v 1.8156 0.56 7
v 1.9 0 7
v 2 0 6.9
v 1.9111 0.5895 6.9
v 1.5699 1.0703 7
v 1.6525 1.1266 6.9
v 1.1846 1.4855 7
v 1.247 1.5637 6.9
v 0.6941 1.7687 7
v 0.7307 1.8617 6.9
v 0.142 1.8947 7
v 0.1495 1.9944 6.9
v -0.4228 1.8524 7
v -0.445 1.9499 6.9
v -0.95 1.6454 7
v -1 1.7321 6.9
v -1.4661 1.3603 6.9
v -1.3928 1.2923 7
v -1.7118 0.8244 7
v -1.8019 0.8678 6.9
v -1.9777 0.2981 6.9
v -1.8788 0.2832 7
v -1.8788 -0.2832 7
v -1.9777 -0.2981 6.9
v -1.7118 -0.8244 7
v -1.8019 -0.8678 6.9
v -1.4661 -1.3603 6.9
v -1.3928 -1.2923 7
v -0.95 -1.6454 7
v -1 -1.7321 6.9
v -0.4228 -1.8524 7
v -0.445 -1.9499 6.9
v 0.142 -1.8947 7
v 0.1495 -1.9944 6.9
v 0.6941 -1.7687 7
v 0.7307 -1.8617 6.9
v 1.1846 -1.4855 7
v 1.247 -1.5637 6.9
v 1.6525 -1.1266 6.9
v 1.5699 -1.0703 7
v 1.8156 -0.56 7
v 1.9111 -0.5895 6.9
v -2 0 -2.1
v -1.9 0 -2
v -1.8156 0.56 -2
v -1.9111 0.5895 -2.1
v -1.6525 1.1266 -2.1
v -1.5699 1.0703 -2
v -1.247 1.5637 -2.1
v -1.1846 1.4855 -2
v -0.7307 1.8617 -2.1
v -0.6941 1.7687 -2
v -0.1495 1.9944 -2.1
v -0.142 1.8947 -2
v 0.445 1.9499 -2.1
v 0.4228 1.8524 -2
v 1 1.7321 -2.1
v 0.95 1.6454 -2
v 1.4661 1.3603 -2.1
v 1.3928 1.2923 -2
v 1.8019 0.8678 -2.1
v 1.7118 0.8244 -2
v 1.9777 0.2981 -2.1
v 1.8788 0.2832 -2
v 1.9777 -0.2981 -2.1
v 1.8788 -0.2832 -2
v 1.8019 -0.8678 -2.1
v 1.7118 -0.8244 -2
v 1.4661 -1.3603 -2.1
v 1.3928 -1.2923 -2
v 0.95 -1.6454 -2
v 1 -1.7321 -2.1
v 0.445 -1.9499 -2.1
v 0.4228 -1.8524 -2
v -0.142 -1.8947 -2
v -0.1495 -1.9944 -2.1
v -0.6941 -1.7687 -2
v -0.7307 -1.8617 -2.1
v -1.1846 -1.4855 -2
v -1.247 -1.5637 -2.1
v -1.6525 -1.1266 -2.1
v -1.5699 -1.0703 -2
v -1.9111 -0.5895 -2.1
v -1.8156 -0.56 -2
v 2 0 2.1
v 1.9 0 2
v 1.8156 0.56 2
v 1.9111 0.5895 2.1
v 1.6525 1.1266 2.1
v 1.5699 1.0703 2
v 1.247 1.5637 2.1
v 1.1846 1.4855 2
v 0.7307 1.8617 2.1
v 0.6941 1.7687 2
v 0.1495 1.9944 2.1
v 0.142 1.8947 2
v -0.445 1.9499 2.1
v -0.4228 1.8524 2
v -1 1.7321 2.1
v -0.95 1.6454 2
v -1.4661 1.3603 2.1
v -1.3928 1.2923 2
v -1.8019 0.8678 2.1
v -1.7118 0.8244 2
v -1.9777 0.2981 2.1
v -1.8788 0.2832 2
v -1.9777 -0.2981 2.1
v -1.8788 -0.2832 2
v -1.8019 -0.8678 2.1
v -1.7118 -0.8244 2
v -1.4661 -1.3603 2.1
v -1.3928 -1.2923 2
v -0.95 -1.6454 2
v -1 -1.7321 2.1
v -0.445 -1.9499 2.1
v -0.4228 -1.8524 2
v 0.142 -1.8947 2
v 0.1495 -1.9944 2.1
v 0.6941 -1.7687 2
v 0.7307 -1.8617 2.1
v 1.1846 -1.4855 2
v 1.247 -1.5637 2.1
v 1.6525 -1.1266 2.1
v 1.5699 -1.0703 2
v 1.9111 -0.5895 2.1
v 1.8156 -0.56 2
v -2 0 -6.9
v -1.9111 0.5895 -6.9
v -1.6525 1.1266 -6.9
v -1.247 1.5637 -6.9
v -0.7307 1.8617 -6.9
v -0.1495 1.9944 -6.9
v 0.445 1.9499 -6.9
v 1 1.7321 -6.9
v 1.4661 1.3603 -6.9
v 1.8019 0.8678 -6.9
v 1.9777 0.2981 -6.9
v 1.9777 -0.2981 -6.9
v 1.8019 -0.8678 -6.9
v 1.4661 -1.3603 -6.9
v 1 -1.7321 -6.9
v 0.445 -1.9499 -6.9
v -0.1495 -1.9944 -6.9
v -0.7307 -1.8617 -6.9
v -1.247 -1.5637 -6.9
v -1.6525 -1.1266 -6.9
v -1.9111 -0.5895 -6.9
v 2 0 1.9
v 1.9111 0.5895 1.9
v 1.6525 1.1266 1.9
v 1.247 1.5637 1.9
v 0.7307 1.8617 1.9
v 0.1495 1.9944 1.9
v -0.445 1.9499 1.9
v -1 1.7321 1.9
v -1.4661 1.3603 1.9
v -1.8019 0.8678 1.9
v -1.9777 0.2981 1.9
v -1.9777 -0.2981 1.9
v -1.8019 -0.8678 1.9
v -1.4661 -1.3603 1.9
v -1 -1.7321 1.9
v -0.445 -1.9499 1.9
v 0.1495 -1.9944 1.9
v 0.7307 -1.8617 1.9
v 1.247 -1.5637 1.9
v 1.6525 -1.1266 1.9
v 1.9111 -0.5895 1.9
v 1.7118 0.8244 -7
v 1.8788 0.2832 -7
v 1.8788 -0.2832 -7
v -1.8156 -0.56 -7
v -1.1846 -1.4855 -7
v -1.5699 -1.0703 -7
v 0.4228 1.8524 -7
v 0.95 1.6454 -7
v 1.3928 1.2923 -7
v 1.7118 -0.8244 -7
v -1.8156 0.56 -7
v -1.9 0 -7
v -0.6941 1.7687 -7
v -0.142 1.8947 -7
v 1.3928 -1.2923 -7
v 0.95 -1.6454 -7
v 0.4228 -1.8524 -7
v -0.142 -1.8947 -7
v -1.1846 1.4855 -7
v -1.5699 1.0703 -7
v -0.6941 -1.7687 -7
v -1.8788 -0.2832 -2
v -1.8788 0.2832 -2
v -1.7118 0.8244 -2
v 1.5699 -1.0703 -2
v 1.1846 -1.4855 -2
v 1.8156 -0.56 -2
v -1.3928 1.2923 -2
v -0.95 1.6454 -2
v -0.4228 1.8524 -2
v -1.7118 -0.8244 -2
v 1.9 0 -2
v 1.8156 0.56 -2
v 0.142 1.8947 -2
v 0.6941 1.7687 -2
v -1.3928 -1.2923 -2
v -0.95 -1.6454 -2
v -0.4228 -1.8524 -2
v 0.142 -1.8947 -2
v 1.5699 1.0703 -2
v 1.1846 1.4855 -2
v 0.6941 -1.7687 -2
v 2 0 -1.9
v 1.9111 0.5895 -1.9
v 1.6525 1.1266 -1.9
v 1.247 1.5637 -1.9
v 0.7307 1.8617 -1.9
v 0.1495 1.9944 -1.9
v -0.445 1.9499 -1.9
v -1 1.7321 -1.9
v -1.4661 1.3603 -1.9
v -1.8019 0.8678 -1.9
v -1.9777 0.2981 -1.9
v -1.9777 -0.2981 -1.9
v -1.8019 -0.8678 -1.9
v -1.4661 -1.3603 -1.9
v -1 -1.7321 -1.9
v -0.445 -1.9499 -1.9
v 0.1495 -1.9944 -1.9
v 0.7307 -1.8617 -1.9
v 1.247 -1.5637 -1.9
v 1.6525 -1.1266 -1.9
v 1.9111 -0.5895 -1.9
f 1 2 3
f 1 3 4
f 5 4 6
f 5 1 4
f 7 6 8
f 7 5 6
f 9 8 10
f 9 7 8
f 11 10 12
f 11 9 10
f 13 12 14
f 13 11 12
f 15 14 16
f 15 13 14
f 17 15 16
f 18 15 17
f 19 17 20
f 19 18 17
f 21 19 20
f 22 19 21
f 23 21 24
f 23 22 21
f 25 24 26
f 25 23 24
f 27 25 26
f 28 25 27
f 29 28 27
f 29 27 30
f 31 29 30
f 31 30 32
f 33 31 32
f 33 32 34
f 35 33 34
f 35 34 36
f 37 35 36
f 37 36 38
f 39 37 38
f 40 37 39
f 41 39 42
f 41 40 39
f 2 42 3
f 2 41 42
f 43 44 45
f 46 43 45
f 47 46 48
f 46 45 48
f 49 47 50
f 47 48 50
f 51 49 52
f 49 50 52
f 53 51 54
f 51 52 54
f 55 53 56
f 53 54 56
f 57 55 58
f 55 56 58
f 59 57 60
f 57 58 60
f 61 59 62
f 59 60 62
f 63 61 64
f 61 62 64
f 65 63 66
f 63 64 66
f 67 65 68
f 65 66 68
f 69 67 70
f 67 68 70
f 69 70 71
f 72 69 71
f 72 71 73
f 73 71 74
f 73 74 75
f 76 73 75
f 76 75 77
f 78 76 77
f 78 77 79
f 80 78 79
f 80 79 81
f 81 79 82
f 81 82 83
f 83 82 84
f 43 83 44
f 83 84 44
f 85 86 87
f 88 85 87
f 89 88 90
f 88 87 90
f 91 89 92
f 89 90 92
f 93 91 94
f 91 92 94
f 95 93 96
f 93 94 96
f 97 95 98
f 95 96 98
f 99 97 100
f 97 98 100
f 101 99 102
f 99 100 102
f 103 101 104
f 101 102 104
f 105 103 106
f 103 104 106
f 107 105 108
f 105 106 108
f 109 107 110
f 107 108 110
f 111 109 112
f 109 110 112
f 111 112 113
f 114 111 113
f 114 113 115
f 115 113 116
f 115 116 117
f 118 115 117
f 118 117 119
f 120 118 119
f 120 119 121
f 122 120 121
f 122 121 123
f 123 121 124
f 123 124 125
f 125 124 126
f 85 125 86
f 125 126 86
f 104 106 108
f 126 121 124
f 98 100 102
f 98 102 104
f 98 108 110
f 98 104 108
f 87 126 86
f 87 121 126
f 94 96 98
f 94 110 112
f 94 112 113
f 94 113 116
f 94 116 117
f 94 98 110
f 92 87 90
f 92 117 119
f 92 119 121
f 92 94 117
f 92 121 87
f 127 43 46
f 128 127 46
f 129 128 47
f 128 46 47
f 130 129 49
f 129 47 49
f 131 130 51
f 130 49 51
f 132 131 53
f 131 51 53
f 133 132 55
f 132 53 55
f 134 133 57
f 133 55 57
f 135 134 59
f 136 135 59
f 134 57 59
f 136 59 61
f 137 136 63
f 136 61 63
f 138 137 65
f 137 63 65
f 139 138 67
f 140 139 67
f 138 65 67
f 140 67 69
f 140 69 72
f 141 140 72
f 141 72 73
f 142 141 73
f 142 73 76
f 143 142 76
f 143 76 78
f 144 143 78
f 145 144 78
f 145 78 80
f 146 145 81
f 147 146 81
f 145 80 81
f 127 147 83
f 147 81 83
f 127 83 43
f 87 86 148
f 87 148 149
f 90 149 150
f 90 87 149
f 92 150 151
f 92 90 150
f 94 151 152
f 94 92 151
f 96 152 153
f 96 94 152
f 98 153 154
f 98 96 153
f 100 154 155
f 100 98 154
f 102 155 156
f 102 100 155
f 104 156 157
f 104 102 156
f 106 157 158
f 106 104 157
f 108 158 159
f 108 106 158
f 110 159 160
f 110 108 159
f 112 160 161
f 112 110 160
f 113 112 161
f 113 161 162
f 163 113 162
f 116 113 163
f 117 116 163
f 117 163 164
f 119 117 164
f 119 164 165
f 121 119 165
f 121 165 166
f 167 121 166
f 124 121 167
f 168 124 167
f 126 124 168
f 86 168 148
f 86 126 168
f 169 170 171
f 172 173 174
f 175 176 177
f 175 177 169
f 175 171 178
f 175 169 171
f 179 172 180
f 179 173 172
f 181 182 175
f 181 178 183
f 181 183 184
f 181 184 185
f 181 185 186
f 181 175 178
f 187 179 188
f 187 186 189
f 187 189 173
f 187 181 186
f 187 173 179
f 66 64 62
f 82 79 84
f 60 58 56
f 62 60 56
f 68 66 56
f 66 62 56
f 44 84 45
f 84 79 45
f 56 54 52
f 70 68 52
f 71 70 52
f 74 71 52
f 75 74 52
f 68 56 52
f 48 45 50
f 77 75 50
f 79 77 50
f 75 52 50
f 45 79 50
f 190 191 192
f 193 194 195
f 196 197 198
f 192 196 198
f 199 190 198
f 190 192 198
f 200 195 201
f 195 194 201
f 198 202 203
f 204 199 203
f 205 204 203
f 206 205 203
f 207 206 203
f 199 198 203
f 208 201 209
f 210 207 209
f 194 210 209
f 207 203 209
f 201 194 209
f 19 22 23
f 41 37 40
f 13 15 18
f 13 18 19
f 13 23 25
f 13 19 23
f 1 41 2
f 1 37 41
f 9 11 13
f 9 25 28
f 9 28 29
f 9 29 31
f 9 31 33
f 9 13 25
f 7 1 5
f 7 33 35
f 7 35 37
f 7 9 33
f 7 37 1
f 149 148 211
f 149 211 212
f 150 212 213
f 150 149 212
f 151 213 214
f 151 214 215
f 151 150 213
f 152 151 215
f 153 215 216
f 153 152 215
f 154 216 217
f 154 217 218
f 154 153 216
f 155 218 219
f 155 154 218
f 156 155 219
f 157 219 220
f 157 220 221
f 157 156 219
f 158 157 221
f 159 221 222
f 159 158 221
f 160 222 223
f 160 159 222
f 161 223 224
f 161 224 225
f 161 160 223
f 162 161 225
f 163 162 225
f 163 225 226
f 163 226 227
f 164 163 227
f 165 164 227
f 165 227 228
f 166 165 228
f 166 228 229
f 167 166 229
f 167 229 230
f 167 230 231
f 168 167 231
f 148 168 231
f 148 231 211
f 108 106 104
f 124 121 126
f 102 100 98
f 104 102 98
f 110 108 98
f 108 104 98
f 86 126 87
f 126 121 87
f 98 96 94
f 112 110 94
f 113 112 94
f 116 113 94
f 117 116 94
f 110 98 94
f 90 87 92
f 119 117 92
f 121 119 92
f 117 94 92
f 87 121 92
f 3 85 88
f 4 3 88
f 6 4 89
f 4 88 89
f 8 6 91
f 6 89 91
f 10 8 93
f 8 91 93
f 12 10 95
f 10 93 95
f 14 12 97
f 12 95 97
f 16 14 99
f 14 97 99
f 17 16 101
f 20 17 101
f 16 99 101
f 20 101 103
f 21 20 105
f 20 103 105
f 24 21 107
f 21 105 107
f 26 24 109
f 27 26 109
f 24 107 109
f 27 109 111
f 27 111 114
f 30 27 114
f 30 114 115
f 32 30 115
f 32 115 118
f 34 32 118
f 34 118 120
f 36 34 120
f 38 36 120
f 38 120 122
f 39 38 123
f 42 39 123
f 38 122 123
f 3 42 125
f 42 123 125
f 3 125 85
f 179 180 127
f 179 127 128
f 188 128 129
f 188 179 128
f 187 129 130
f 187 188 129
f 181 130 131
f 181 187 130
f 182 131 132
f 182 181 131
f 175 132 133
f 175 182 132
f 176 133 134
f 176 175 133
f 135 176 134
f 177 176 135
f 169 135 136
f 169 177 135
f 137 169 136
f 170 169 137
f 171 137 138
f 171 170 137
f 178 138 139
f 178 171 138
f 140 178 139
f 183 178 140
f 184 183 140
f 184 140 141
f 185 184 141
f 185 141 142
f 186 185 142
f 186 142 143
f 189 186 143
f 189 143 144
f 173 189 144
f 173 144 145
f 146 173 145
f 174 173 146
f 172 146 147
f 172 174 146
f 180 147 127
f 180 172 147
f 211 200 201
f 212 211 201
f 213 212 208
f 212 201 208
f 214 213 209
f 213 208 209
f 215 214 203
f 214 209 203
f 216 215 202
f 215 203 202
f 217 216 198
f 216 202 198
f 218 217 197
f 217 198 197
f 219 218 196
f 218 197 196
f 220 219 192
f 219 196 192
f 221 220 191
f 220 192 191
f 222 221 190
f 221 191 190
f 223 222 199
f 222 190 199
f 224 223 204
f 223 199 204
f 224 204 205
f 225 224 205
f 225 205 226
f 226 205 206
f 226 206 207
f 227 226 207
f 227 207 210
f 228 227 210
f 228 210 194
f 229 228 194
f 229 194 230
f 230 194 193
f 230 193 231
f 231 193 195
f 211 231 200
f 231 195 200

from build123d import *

# Parameters (mm, degrees)
SKETCH2_R           = 2
BOSS_EXTRUDE1_DEPTH = 2
SKETCH3_R           = 2
BOSS_EXTRUDE2_DEPTH = 5
SKETCH4_R           = 2
BOSS_EXTRUDE3_DEPTH = 5
CHAMFER1_SIZE       = 0.1
CHAMFER2_SIZE       = 0.1
CHAMFER3_SIZE       = 0.1


with BuildPart() as part:
    # Sketch2 → Boss-Extrude1 (new, symmetric)
    with BuildSketch(Plane.XY):
        Circle(SKETCH2_R)
    extrude(amount=BOSS_EXTRUDE1_DEPTH, both=True)

    # Chamfer3
    chamfer3_edges = [part.edges().sort_by_distance(p)[0] for p in [
        (-2, 0, -2),
        (-2, 0, 2),
    ]]
    chamfer(chamfer3_edges, length=CHAMFER3_SIZE)


with BuildPart() as body_2:
    # Sketch3 → Boss-Extrude2 (new body)
    with BuildSketch(Plane.XY.offset(2)):
        Circle(SKETCH3_R)
    extrude(amount=BOSS_EXTRUDE2_DEPTH)

    # Chamfer1
    chamfer1_edges = [body_2.edges().sort_by_distance(p)[0] for p in [
        (-2, 0, 2),
        (-2, 0, 7),
    ]]
    chamfer(chamfer1_edges, length=CHAMFER1_SIZE)


with BuildPart() as body_3:
    # Sketch4 → Boss-Extrude3 (new body)
    with BuildSketch(Plane(origin=(0, 0, -2), x_dir=(-1, 0, 0), z_dir=(0, 0, -1))):
        Circle(SKETCH4_R)
    extrude(amount=BOSS_EXTRUDE3_DEPTH)

    # Chamfer2
    chamfer2_edges = [body_3.edges().sort_by_distance(p)[0] for p in [
        (2, 0, -2),
        (2, 0, -7),
    ]]
    chamfer(chamfer2_edges, length=CHAMFER2_SIZE)


solid = Compound([part.part, body_2.part, body_3.part])
